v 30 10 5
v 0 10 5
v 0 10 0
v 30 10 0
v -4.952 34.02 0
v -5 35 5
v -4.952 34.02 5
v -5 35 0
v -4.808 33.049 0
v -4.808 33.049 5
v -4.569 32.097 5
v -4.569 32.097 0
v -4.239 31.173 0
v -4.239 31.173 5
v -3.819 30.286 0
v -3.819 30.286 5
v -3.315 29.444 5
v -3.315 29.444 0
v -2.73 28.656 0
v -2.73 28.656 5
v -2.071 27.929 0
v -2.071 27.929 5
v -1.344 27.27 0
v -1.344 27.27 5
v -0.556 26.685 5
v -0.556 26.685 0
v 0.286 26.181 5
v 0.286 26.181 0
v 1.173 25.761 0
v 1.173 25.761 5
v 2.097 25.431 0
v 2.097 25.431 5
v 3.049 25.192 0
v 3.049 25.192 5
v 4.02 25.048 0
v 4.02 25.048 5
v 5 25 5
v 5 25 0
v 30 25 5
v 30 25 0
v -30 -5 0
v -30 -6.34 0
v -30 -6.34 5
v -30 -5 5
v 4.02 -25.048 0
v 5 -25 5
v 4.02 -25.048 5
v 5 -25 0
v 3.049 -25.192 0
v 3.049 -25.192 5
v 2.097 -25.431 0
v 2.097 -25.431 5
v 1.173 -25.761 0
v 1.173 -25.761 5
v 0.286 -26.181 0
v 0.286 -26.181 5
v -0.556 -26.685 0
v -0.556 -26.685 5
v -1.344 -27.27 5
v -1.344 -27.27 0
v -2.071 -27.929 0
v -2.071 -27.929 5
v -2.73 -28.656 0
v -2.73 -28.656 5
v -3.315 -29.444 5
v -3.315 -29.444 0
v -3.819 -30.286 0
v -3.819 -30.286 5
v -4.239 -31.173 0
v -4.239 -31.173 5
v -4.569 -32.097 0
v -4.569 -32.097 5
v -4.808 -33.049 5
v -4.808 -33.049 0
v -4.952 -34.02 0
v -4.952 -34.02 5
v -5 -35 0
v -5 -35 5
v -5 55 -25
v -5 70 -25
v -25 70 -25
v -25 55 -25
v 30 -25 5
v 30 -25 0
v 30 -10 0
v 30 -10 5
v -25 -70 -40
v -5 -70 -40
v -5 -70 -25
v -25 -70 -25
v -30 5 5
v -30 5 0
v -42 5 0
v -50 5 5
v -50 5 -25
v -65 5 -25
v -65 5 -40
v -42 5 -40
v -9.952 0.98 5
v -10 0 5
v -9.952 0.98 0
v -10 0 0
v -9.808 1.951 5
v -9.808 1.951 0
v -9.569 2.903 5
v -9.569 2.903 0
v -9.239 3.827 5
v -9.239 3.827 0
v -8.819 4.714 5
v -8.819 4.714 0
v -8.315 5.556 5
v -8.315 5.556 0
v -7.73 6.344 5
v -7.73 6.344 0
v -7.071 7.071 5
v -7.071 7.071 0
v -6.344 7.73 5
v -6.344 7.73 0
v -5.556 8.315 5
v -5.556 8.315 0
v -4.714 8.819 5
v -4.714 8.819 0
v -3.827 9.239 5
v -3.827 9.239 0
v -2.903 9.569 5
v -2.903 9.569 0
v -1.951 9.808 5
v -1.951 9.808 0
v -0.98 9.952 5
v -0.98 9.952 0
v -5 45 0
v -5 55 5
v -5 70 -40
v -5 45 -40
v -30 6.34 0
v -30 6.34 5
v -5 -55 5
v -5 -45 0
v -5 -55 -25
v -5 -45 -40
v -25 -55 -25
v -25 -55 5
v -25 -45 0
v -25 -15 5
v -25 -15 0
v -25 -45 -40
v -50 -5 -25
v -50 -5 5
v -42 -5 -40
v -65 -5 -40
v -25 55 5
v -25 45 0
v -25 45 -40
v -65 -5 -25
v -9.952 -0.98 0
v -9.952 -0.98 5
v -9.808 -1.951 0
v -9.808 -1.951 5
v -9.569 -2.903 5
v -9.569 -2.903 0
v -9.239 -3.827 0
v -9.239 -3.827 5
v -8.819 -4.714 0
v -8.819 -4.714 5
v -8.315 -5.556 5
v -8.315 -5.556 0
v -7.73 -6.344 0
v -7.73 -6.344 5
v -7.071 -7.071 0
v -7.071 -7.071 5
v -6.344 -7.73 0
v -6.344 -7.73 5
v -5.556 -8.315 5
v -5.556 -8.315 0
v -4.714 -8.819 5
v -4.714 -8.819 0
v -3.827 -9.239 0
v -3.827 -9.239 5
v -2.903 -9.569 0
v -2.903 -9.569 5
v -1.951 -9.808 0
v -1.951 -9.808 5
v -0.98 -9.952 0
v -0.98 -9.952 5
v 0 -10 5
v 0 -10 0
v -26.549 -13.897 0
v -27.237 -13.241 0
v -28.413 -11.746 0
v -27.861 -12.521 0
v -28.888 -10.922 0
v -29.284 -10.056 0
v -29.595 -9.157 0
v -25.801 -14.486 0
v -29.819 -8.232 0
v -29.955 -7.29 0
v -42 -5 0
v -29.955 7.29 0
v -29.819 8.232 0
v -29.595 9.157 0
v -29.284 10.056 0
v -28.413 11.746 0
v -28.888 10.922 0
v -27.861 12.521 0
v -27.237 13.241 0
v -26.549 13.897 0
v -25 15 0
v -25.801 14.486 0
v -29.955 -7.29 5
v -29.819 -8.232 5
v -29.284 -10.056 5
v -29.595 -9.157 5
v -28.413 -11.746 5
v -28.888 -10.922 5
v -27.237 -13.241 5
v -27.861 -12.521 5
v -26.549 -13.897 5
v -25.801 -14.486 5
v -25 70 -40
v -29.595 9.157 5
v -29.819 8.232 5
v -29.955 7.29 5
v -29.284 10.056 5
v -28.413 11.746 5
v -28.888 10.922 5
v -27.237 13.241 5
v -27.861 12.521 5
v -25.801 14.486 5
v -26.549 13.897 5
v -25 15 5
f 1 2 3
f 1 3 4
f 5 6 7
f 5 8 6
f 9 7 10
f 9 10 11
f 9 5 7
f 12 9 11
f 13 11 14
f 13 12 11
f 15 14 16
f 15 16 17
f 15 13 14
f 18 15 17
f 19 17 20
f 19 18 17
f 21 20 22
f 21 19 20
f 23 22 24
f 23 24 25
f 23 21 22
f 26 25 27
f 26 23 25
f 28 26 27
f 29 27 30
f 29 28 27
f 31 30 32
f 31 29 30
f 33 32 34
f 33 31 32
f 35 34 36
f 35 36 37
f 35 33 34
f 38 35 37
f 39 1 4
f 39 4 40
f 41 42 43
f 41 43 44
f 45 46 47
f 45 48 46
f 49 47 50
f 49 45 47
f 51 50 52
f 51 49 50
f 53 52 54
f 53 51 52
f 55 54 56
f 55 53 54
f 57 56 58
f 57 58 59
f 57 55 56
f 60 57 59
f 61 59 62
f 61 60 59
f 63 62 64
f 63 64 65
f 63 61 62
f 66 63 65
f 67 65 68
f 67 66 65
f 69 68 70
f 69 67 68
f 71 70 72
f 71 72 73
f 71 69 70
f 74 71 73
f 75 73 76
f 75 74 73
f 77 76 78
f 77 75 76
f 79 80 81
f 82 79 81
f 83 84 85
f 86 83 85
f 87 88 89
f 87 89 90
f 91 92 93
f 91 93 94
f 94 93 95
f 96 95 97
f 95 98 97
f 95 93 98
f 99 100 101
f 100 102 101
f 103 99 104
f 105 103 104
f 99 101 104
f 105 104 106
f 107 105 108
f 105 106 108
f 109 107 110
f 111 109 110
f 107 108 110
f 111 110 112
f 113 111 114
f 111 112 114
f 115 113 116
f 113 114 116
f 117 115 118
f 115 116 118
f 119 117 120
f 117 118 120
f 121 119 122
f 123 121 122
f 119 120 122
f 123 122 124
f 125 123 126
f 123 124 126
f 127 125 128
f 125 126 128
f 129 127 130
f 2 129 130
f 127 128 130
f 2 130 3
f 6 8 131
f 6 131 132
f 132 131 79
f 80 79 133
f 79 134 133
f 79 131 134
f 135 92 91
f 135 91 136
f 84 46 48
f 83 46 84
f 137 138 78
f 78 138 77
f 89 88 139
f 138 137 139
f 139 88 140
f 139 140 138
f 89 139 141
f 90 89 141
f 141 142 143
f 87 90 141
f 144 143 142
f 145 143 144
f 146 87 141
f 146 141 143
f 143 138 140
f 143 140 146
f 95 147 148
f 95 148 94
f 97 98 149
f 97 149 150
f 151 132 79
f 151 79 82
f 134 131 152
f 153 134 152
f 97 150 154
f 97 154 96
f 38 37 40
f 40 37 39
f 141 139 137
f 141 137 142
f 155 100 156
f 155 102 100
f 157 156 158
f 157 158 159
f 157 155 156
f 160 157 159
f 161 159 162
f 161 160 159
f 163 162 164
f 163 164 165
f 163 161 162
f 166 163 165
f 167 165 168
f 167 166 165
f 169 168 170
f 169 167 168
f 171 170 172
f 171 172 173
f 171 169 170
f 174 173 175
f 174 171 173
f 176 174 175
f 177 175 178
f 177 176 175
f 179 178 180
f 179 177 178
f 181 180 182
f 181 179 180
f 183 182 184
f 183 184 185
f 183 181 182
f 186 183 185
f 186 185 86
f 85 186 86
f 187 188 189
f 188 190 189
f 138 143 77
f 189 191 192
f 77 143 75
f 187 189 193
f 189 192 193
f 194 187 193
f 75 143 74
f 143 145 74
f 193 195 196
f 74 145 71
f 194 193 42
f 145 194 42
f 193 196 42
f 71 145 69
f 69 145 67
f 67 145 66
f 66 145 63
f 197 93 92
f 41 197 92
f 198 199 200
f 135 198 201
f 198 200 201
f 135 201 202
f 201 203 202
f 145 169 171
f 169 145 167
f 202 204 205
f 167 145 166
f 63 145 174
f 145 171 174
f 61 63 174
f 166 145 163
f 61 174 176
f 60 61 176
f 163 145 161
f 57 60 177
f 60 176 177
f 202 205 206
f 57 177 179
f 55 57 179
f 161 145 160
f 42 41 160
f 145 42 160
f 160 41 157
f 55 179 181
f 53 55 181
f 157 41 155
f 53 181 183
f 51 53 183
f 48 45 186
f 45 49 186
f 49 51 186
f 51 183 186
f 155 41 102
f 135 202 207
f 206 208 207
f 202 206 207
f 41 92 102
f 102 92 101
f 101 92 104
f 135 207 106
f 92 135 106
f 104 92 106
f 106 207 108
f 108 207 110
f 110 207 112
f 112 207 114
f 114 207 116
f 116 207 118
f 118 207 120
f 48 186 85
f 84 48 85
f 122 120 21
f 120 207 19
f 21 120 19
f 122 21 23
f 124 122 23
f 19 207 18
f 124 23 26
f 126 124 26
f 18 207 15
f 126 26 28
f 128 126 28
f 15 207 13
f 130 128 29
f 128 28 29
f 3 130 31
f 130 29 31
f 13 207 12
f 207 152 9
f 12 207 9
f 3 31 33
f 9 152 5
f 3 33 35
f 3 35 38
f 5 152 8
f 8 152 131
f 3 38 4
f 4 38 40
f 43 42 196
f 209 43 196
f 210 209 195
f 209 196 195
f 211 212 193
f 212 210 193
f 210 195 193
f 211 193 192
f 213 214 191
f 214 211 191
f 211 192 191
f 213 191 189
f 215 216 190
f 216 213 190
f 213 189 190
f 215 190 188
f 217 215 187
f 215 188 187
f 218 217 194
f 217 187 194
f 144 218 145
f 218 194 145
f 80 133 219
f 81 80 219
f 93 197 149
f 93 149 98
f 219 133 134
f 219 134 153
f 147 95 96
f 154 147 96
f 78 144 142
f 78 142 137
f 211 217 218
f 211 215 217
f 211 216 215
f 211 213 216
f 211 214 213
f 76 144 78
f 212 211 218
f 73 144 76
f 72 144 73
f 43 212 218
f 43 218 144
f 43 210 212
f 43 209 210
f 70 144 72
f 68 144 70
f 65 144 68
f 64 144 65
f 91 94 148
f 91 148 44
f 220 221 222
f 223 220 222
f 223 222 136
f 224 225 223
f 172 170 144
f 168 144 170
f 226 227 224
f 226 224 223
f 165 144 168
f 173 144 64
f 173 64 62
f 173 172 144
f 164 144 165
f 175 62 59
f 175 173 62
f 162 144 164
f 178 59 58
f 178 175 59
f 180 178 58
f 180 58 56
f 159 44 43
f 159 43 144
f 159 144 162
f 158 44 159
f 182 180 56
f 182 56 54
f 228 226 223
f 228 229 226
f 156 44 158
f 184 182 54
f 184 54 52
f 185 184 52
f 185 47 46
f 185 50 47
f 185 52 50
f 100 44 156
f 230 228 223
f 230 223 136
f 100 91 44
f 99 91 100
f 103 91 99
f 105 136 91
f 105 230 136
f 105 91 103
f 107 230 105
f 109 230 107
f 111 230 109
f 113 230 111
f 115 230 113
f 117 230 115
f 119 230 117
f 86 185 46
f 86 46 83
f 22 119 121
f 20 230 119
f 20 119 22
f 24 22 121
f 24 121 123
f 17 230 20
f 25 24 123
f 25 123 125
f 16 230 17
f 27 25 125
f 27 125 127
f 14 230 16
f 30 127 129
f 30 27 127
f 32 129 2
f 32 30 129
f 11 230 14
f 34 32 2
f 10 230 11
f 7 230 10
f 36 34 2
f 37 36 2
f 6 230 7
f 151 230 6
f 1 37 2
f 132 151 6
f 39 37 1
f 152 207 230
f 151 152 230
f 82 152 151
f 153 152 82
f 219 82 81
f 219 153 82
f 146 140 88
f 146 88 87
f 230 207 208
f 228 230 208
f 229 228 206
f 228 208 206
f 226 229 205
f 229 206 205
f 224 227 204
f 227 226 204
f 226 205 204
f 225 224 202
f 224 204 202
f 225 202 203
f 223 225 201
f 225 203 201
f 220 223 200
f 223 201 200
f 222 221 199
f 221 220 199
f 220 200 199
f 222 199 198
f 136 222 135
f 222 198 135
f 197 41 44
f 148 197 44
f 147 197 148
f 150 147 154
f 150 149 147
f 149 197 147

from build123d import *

# Parameters (mm, degrees)
SKETCH_1_W          = 60
SKETCH_1_H          = 30
EXTRUDE_1_DEPTH     = 5
SKETCH_2_W          = 7.4
SKETCH_2_H          = 1.2
SKETCH_2_W_2        = 7
SKETCH_2_H_2        = 0.8
CUT_EXTRUDE_1_DEPTH = 10
SKETCH_3_W          = 40.4
SKETCH_3_H          = 20.4
SKETCH_3_W_2        = 40
SKETCH_3_H_2        = 20
CUT_EXTRUDE_2_DEPTH = 10
SKETCH_5_W          = 20
SKETCH_5_H          = 40
SKETCH_5_H_2        = 10
EXTRUDE_2_DEPTH     = 5
SKETCH_6_W          = 20
SKETCH_6_H          = 10
SKETCH_6_W_2        = 8
EXTRUDE_3_DEPTH     = 40
SKETCH_7_W          = 20
SKETCH_7_H          = 15
SKETCH_7_W_2        = 15
SKETCH_7_H_2        = 10
EXTRUDE_4_DEPTH     = 15
SKETCH_8_W          = 54.931929912
SKETCH_8_H          = 24.682509144
EXTRUDE_5_DEPTH     = 5
SKETCH_9_W          = 40
SKETCH_9_H          = 20
CUT_EXTRUDE_3_DEPTH = 5
SKETCH_10_W         = 35
SKETCH_10_H         = 10
EXTRUDE_6_DEPTH     = 5
FILLET_2_R          = 10
FILLET_3_R          = 10


# Some blends are built 0.0001 mm under size
with BuildPart() as part:
    # 草图1 → 凸台-拉伸1 (new body)
    with BuildSketch(Plane.XY):
        Rectangle(SKETCH_1_W, SKETCH_1_H)
        Polygon((20, 0.4), (20, 10), (-20, 10), (-20, 0.4), (-27, 0.4), (-27, -0.4), (-20, -0.4), (-20, -10), (20, -10), (20, -0.4), (27, -0.4), (27, 0.4), align=None, mode=Mode.SUBTRACT)
    extrude(amount=EXTRUDE_1_DEPTH)

    # 草图2 → 切除-拉伸1 (cut)
    # profile 1 of 2: a face of its own
    with BuildSketch(Plane.XY.offset(5)):
        with Locations((-23.5, 0)):
            Rectangle(SKETCH_2_W, SKETCH_2_H)
        with Locations((-23.5, 0)):
            Rectangle(SKETCH_2_W_2, SKETCH_2_H_2, mode=Mode.SUBTRACT)
    # profile 2 of 2: a face of its own
    with BuildSketch(Plane.XY.offset(5)):
        with Locations((23.5, 0)):
            Rectangle(SKETCH_2_W, SKETCH_2_H)
        with Locations((23.5, 0)):
            Rectangle(SKETCH_2_W_2, SKETCH_2_H_2, mode=Mode.SUBTRACT)
    extrude(amount=-CUT_EXTRUDE_1_DEPTH, mode=Mode.SUBTRACT)

    # 草图3 → 切除-拉伸2 (cut)
    with BuildSketch(Plane.XY.offset(5)):
        Rectangle(SKETCH_3_W, SKETCH_3_H)
        Rectangle(SKETCH_3_W_2, SKETCH_3_H_2, mode=Mode.SUBTRACT)
    extrude(amount=-CUT_EXTRUDE_2_DEPTH, mode=Mode.SUBTRACT)

    # 草图5 → 凸台-拉伸2 (add)
    with BuildSketch(Plane(origin=(0, 0, 0), x_dir=(-1, 0, 0), z_dir=(0, 0, -1))):
        with Locations((15, 35)):
            Rectangle(SKETCH_5_W, SKETCH_5_H)
        with Locations((15, -35)):
            Rectangle(SKETCH_5_W, SKETCH_5_H)
        with Locations((40, 0)):
            Rectangle(SKETCH_5_W, SKETCH_5_H_2)
    extrude(amount=-EXTRUDE_2_DEPTH)

    # 草图6 → 凸台-拉伸3 (add)
    with BuildSketch(Plane(origin=(0, 0, 0), x_dir=(-1, 0, 0), z_dir=(0, 0, -1))):
        with Locations((15, 50)):
            Rectangle(SKETCH_6_W, SKETCH_6_H)
        with Locations((15, -50)):
            Rectangle(SKETCH_6_W, SKETCH_6_H)
        with Locations((46, 0)):
            Rectangle(SKETCH_6_W_2, SKETCH_6_H)
    extrude(amount=EXTRUDE_3_DEPTH)

    # 草图7 → 凸台-拉伸4 (add)
    with BuildSketch(Plane(origin=(0, 0, -40), x_dir=(-1, 0, 0), z_dir=(0, 0, -1))):
        with Locations((15, 62.5)):
            Rectangle(SKETCH_7_W, SKETCH_7_H)
        with Locations((15, -62.5)):
            Rectangle(SKETCH_7_W, SKETCH_7_H)
        with Locations((57.5, 0)):
            Rectangle(SKETCH_7_W_2, SKETCH_7_H_2)
    extrude(amount=-EXTRUDE_4_DEPTH)

    # 草图8 → 凸台-拉伸5 (add)
    with BuildSketch(Plane.XY.offset(5)):
        Rectangle(SKETCH_8_W, SKETCH_8_H)
    extrude(amount=-EXTRUDE_5_DEPTH)

    # 草图9 → 切除-拉伸3 (cut)
    with BuildSketch(Plane.XY.offset(5)):
        with Locations((10, 0)):
            Rectangle(SKETCH_9_W, SKETCH_9_H)
    extrude(amount=-CUT_EXTRUDE_3_DEPTH, mode=Mode.SUBTRACT)

    # 草图10 → 凸台-拉伸6 (add)
    with BuildSketch(Plane.XY.offset(5)):
        with Locations((12.5, 20)):
            Rectangle(SKETCH_10_W, SKETCH_10_H)
        with Locations((12.5, -20)):
            Rectangle(SKETCH_10_W, SKETCH_10_H)
    extrude(amount=-EXTRUDE_6_DEPTH)

    # 圆角2
    fillet_2_edges = [part.edges().sort_by_distance(p)[0] for p in [
        (-10, -10, 2.5),
        (-10, 10, 2.5),
        (-5, -25, 2.5),
        (-5, 25, 2.5),
    ]]
    fillet(fillet_2_edges, radius=FILLET_2_R - 0.0001)  # a hair under: the kernel refuses the full size

    # 圆角3
    # the kernel refuses this fillet: 10 mm, written as the material it takes off along each edge
    with BuildSketch(Plane(origin=(-30, -15, -21.650635095), x_dir=(0, 1, 0), z_dir=(0, 0, 1))) as fillet_3_piece_1:
        with BuildLine():
            CenterArc((8.660254038, -10), FILLET_3_R, 90, 60)
            Line((0, -5), (-0.173205081, -4.9))
            ThreePointArc((-0.173205081, -4.9), (-0.2, -2.5), (-0.2, 0))
            Line((-0.2, 0), (0, 0.2))
            Line((0, 0.2), (8.660254038, 0.2))
            Line((8.660254038, 0.2), (8.660254038, 0))
        make_face()
    extrude(amount=48.301270189, mode=Mode.SUBTRACT)
    with BuildSketch(Plane(origin=(-30, 15, -21.650635095), x_dir=(1, 0, 0), z_dir=(0, 0, 1))) as fillet_3_piece_2:
        with BuildLine():
            CenterArc((10, -8.660254038), FILLET_3_R, 120, 60)
            Line((0, -8.660254038), (-0.2, -8.660254038))
            Line((-0.2, -8.660254038), (-0.2, 0))
            Line((-0.2, 0), (0, 0.2))
            ThreePointArc((0, 0.2), (2.5, 0.2), (4.9, 0.173205081))
            Line((4.9, 0.173205081), (5, 0))
        make_face()
    extrude(amount=48.301270189, mode=Mode.SUBTRACT)


solid = part.part
